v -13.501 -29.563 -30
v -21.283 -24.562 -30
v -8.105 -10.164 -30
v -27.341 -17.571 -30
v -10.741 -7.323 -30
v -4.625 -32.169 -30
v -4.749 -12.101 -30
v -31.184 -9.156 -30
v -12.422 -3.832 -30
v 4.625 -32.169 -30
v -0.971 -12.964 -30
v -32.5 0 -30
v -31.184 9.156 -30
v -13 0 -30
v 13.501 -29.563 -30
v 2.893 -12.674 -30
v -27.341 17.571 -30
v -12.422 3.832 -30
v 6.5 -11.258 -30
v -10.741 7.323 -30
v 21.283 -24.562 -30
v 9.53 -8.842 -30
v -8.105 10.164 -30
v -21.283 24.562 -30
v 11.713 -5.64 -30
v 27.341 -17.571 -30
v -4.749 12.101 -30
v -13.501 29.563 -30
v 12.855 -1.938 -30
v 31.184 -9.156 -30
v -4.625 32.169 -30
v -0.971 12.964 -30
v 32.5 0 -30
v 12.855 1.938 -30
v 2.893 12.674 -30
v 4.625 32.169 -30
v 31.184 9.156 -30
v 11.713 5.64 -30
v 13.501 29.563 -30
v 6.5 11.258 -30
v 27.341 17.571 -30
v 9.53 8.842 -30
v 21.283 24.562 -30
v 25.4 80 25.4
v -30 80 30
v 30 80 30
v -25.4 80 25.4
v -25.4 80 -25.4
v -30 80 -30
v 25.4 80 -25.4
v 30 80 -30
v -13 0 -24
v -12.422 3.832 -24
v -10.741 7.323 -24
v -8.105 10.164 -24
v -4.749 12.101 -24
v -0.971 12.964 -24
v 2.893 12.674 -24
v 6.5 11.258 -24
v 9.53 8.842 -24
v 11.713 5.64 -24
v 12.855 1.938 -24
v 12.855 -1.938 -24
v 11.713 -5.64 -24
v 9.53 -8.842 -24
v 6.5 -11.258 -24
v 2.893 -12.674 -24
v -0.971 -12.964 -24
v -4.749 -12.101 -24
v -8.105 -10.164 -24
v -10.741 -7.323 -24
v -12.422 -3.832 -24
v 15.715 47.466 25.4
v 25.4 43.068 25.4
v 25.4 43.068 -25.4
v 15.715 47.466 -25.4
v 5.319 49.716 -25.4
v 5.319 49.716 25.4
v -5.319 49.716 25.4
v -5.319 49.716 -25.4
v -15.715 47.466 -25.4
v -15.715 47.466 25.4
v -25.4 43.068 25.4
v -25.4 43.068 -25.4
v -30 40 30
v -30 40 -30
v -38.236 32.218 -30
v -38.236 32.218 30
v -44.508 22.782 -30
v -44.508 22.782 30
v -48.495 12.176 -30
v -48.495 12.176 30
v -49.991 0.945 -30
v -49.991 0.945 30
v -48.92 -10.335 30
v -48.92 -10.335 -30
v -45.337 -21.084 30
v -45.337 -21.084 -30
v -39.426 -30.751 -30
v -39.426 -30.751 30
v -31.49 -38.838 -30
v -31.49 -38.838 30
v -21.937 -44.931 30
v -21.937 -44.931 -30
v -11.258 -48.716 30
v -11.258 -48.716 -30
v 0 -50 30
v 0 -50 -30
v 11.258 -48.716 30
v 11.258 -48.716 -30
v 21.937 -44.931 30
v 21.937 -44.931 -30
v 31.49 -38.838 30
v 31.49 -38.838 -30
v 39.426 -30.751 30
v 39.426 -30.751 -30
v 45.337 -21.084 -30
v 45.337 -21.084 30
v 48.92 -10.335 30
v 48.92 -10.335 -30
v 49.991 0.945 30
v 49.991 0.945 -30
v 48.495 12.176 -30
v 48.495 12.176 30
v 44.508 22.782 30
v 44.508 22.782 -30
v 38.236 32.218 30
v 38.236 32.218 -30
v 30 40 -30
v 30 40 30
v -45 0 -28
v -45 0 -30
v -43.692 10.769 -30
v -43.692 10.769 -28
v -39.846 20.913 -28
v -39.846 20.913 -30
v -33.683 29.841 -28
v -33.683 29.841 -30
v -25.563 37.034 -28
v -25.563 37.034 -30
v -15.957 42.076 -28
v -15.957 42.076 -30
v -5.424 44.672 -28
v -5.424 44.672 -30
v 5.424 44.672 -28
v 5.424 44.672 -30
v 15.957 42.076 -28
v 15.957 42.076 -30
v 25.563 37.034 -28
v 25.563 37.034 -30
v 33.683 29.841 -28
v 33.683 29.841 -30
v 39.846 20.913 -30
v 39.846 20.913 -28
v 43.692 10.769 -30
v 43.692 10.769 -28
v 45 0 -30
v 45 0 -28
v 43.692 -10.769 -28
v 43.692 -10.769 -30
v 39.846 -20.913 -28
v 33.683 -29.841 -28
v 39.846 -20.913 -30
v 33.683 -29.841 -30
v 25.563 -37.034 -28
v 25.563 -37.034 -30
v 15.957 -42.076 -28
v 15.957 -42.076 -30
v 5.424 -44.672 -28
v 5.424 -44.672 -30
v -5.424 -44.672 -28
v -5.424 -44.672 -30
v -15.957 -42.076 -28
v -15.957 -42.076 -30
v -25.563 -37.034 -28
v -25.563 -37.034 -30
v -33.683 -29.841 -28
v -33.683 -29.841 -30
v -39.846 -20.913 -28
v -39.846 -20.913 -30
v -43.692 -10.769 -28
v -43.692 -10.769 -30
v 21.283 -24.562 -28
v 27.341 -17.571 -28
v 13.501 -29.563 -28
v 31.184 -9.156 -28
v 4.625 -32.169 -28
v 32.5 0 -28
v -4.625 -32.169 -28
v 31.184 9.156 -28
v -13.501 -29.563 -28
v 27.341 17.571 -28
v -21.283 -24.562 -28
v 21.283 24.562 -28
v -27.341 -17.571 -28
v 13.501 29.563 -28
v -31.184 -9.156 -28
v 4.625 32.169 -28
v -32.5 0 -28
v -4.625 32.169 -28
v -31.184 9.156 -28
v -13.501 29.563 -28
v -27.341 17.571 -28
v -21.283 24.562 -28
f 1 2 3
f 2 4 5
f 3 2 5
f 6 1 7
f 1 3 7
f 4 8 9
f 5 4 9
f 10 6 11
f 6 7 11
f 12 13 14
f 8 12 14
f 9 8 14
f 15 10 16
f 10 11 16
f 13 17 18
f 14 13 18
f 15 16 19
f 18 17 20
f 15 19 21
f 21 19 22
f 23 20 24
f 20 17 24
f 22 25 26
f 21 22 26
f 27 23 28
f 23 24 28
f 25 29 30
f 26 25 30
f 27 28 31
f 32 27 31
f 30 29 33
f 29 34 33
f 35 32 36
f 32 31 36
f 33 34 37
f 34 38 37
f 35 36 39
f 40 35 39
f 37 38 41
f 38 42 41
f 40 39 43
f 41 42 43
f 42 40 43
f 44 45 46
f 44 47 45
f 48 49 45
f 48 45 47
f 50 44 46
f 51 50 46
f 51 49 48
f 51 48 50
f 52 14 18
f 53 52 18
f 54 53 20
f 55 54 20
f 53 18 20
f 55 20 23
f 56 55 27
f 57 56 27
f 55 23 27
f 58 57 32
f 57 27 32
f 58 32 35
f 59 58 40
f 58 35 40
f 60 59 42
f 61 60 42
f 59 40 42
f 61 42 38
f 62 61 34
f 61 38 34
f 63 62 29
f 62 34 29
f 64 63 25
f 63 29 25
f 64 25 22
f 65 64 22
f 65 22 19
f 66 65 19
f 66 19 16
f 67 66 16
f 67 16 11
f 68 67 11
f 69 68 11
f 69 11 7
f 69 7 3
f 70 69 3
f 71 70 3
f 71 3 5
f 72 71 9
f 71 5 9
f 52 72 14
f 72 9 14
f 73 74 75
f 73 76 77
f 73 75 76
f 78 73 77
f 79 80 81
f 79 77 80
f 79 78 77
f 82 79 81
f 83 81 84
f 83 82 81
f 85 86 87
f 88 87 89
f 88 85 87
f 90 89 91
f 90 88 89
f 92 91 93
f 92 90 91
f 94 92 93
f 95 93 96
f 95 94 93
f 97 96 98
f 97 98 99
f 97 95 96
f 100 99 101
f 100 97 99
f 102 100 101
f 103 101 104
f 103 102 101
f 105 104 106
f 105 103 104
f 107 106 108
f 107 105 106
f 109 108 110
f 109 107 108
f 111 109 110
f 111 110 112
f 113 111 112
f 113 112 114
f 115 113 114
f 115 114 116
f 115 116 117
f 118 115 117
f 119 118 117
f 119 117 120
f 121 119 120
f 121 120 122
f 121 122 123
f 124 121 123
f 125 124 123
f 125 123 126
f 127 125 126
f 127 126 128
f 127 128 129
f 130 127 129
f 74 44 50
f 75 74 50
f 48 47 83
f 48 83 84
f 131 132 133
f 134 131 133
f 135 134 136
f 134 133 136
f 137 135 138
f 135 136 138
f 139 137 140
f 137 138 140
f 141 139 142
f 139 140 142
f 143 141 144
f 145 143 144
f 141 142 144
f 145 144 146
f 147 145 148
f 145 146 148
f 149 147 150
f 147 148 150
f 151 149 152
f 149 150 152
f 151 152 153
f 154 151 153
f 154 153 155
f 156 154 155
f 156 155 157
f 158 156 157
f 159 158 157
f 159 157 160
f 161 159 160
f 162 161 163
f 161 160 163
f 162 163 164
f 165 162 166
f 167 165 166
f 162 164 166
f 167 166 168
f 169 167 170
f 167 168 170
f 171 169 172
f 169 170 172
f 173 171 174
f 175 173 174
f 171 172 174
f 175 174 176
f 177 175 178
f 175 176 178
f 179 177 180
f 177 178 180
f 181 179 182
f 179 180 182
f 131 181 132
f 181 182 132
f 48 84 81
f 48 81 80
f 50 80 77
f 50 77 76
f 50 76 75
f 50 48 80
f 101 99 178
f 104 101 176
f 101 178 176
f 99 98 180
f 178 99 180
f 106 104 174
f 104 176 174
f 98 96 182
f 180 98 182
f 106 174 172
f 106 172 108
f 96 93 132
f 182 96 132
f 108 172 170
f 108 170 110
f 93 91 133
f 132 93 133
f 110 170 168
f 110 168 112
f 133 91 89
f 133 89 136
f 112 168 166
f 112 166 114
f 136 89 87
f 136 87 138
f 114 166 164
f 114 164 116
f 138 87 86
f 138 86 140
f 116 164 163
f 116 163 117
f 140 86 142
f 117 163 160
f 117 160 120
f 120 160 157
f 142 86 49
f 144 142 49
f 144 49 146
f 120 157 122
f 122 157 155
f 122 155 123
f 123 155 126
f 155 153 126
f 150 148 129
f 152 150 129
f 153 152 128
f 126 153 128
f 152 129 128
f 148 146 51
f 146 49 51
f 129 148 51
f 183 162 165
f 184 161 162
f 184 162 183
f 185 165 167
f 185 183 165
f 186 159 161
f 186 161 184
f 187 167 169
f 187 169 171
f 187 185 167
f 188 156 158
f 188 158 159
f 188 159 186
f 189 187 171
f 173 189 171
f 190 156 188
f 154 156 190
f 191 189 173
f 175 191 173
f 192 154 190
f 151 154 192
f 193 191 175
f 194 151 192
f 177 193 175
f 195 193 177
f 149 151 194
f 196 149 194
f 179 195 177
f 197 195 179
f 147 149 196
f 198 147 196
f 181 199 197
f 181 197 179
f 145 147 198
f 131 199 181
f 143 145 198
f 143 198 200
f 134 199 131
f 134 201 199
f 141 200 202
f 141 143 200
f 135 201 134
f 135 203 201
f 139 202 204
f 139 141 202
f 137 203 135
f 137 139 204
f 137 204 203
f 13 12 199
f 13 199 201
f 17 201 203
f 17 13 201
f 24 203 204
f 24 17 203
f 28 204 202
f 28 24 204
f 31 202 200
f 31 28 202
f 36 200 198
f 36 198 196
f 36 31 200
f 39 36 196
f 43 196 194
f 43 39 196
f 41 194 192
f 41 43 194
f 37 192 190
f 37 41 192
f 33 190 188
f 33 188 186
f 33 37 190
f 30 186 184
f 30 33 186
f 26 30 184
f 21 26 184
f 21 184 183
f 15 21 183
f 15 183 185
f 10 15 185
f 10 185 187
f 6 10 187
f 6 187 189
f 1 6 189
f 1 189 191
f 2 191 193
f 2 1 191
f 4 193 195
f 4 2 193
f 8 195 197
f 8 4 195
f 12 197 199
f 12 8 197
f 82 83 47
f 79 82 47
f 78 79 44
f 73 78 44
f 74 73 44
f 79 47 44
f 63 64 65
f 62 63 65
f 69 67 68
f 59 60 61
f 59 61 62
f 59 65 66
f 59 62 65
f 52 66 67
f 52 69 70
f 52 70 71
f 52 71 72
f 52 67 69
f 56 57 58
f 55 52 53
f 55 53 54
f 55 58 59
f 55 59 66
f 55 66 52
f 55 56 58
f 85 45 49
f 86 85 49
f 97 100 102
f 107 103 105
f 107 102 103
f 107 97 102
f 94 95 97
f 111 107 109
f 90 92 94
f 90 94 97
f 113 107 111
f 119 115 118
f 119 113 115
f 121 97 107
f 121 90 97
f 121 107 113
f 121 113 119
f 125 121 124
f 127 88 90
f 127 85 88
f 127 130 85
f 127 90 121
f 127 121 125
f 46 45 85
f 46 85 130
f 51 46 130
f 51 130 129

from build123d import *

# Parameters (mm, degrees)
CROQUIS1_R                   = 50
SALIENTE_EXTRUIR1_DEPTH      = 30
CROQUIS2_R                   = 45
CROQUIS2_R_2                 = 32.5
CORTAR_EXTRUIR1_DEPTH        = 2
CROQUIS3_R                   = 13
CORTAR_EXTRUIR2_DEPTH        = 6
SALIENTE_EXTRUIR2_REACH      = 144.478
SALIENTE_EXTRUIR2_END_RADIUS = 50
CROQUIS5_W                   = 60
CROQUIS5_H                   = 60
CROQUIS5_W_2                 = 50.8
CROQUIS5_H_2                 = 50.8


with BuildPart() as part:
    # Croquis1 → Saliente-Extruir1 (new, symmetric)
    with BuildSketch(Plane.XY):
        Circle(CROQUIS1_R)
    extrude(amount=SALIENTE_EXTRUIR1_DEPTH, both=True)

    # Croquis2 → Cortar-Extruir1 (cut)
    with BuildSketch(Plane(origin=(0, 0, -30), x_dir=(-1, 0, 0), z_dir=(0, 0, -1))):
        Circle(CROQUIS2_R)
        Circle(CROQUIS2_R_2, mode=Mode.SUBTRACT)
    extrude(amount=-CORTAR_EXTRUIR1_DEPTH, mode=Mode.SUBTRACT)

    # Croquis3 → Cortar-Extruir2 (cut)
    with BuildSketch(Plane(origin=(0, 0, -30), x_dir=(-1, 0, 0), z_dir=(0, 0, -1))):
        Circle(CROQUIS3_R)
    extrude(amount=-CORTAR_EXTRUIR2_DEPTH, mode=Mode.SUBTRACT)

    # Saliente-Extruir2: up to this cylinder (the profile starts outside it)
    saliente_extruir2_end = Plane(origin=(0, 0, 29.151472), z_dir=(0, 0, -1)) * Cylinder(SALIENTE_EXTRUIR2_END_RADIUS, 389.956, mode=Mode.PRIVATE)
    # Croquis5 → Saliente-Extruir2 (add, up to the surface)
    with BuildSketch(Plane(origin=(0, 80, 0), x_dir=(1, 0, 0), z_dir=(0, 1, 0)), mode=Mode.PRIVATE) as saliente_extruir2_sk1:
        Rectangle(CROQUIS5_W, CROQUIS5_H)
        Rectangle(CROQUIS5_W_2, CROQUIS5_H_2, mode=Mode.SUBTRACT)
    saliente_extruir2_tool1 = extrude(saliente_extruir2_sk1.sketch, amount=-SALIENTE_EXTRUIR2_REACH, mode=Mode.PRIVATE) - saliente_extruir2_end
    add(saliente_extruir2_tool1.solids().sort_by_distance((0, 80, 29.151472))[0])


solid = part.part
